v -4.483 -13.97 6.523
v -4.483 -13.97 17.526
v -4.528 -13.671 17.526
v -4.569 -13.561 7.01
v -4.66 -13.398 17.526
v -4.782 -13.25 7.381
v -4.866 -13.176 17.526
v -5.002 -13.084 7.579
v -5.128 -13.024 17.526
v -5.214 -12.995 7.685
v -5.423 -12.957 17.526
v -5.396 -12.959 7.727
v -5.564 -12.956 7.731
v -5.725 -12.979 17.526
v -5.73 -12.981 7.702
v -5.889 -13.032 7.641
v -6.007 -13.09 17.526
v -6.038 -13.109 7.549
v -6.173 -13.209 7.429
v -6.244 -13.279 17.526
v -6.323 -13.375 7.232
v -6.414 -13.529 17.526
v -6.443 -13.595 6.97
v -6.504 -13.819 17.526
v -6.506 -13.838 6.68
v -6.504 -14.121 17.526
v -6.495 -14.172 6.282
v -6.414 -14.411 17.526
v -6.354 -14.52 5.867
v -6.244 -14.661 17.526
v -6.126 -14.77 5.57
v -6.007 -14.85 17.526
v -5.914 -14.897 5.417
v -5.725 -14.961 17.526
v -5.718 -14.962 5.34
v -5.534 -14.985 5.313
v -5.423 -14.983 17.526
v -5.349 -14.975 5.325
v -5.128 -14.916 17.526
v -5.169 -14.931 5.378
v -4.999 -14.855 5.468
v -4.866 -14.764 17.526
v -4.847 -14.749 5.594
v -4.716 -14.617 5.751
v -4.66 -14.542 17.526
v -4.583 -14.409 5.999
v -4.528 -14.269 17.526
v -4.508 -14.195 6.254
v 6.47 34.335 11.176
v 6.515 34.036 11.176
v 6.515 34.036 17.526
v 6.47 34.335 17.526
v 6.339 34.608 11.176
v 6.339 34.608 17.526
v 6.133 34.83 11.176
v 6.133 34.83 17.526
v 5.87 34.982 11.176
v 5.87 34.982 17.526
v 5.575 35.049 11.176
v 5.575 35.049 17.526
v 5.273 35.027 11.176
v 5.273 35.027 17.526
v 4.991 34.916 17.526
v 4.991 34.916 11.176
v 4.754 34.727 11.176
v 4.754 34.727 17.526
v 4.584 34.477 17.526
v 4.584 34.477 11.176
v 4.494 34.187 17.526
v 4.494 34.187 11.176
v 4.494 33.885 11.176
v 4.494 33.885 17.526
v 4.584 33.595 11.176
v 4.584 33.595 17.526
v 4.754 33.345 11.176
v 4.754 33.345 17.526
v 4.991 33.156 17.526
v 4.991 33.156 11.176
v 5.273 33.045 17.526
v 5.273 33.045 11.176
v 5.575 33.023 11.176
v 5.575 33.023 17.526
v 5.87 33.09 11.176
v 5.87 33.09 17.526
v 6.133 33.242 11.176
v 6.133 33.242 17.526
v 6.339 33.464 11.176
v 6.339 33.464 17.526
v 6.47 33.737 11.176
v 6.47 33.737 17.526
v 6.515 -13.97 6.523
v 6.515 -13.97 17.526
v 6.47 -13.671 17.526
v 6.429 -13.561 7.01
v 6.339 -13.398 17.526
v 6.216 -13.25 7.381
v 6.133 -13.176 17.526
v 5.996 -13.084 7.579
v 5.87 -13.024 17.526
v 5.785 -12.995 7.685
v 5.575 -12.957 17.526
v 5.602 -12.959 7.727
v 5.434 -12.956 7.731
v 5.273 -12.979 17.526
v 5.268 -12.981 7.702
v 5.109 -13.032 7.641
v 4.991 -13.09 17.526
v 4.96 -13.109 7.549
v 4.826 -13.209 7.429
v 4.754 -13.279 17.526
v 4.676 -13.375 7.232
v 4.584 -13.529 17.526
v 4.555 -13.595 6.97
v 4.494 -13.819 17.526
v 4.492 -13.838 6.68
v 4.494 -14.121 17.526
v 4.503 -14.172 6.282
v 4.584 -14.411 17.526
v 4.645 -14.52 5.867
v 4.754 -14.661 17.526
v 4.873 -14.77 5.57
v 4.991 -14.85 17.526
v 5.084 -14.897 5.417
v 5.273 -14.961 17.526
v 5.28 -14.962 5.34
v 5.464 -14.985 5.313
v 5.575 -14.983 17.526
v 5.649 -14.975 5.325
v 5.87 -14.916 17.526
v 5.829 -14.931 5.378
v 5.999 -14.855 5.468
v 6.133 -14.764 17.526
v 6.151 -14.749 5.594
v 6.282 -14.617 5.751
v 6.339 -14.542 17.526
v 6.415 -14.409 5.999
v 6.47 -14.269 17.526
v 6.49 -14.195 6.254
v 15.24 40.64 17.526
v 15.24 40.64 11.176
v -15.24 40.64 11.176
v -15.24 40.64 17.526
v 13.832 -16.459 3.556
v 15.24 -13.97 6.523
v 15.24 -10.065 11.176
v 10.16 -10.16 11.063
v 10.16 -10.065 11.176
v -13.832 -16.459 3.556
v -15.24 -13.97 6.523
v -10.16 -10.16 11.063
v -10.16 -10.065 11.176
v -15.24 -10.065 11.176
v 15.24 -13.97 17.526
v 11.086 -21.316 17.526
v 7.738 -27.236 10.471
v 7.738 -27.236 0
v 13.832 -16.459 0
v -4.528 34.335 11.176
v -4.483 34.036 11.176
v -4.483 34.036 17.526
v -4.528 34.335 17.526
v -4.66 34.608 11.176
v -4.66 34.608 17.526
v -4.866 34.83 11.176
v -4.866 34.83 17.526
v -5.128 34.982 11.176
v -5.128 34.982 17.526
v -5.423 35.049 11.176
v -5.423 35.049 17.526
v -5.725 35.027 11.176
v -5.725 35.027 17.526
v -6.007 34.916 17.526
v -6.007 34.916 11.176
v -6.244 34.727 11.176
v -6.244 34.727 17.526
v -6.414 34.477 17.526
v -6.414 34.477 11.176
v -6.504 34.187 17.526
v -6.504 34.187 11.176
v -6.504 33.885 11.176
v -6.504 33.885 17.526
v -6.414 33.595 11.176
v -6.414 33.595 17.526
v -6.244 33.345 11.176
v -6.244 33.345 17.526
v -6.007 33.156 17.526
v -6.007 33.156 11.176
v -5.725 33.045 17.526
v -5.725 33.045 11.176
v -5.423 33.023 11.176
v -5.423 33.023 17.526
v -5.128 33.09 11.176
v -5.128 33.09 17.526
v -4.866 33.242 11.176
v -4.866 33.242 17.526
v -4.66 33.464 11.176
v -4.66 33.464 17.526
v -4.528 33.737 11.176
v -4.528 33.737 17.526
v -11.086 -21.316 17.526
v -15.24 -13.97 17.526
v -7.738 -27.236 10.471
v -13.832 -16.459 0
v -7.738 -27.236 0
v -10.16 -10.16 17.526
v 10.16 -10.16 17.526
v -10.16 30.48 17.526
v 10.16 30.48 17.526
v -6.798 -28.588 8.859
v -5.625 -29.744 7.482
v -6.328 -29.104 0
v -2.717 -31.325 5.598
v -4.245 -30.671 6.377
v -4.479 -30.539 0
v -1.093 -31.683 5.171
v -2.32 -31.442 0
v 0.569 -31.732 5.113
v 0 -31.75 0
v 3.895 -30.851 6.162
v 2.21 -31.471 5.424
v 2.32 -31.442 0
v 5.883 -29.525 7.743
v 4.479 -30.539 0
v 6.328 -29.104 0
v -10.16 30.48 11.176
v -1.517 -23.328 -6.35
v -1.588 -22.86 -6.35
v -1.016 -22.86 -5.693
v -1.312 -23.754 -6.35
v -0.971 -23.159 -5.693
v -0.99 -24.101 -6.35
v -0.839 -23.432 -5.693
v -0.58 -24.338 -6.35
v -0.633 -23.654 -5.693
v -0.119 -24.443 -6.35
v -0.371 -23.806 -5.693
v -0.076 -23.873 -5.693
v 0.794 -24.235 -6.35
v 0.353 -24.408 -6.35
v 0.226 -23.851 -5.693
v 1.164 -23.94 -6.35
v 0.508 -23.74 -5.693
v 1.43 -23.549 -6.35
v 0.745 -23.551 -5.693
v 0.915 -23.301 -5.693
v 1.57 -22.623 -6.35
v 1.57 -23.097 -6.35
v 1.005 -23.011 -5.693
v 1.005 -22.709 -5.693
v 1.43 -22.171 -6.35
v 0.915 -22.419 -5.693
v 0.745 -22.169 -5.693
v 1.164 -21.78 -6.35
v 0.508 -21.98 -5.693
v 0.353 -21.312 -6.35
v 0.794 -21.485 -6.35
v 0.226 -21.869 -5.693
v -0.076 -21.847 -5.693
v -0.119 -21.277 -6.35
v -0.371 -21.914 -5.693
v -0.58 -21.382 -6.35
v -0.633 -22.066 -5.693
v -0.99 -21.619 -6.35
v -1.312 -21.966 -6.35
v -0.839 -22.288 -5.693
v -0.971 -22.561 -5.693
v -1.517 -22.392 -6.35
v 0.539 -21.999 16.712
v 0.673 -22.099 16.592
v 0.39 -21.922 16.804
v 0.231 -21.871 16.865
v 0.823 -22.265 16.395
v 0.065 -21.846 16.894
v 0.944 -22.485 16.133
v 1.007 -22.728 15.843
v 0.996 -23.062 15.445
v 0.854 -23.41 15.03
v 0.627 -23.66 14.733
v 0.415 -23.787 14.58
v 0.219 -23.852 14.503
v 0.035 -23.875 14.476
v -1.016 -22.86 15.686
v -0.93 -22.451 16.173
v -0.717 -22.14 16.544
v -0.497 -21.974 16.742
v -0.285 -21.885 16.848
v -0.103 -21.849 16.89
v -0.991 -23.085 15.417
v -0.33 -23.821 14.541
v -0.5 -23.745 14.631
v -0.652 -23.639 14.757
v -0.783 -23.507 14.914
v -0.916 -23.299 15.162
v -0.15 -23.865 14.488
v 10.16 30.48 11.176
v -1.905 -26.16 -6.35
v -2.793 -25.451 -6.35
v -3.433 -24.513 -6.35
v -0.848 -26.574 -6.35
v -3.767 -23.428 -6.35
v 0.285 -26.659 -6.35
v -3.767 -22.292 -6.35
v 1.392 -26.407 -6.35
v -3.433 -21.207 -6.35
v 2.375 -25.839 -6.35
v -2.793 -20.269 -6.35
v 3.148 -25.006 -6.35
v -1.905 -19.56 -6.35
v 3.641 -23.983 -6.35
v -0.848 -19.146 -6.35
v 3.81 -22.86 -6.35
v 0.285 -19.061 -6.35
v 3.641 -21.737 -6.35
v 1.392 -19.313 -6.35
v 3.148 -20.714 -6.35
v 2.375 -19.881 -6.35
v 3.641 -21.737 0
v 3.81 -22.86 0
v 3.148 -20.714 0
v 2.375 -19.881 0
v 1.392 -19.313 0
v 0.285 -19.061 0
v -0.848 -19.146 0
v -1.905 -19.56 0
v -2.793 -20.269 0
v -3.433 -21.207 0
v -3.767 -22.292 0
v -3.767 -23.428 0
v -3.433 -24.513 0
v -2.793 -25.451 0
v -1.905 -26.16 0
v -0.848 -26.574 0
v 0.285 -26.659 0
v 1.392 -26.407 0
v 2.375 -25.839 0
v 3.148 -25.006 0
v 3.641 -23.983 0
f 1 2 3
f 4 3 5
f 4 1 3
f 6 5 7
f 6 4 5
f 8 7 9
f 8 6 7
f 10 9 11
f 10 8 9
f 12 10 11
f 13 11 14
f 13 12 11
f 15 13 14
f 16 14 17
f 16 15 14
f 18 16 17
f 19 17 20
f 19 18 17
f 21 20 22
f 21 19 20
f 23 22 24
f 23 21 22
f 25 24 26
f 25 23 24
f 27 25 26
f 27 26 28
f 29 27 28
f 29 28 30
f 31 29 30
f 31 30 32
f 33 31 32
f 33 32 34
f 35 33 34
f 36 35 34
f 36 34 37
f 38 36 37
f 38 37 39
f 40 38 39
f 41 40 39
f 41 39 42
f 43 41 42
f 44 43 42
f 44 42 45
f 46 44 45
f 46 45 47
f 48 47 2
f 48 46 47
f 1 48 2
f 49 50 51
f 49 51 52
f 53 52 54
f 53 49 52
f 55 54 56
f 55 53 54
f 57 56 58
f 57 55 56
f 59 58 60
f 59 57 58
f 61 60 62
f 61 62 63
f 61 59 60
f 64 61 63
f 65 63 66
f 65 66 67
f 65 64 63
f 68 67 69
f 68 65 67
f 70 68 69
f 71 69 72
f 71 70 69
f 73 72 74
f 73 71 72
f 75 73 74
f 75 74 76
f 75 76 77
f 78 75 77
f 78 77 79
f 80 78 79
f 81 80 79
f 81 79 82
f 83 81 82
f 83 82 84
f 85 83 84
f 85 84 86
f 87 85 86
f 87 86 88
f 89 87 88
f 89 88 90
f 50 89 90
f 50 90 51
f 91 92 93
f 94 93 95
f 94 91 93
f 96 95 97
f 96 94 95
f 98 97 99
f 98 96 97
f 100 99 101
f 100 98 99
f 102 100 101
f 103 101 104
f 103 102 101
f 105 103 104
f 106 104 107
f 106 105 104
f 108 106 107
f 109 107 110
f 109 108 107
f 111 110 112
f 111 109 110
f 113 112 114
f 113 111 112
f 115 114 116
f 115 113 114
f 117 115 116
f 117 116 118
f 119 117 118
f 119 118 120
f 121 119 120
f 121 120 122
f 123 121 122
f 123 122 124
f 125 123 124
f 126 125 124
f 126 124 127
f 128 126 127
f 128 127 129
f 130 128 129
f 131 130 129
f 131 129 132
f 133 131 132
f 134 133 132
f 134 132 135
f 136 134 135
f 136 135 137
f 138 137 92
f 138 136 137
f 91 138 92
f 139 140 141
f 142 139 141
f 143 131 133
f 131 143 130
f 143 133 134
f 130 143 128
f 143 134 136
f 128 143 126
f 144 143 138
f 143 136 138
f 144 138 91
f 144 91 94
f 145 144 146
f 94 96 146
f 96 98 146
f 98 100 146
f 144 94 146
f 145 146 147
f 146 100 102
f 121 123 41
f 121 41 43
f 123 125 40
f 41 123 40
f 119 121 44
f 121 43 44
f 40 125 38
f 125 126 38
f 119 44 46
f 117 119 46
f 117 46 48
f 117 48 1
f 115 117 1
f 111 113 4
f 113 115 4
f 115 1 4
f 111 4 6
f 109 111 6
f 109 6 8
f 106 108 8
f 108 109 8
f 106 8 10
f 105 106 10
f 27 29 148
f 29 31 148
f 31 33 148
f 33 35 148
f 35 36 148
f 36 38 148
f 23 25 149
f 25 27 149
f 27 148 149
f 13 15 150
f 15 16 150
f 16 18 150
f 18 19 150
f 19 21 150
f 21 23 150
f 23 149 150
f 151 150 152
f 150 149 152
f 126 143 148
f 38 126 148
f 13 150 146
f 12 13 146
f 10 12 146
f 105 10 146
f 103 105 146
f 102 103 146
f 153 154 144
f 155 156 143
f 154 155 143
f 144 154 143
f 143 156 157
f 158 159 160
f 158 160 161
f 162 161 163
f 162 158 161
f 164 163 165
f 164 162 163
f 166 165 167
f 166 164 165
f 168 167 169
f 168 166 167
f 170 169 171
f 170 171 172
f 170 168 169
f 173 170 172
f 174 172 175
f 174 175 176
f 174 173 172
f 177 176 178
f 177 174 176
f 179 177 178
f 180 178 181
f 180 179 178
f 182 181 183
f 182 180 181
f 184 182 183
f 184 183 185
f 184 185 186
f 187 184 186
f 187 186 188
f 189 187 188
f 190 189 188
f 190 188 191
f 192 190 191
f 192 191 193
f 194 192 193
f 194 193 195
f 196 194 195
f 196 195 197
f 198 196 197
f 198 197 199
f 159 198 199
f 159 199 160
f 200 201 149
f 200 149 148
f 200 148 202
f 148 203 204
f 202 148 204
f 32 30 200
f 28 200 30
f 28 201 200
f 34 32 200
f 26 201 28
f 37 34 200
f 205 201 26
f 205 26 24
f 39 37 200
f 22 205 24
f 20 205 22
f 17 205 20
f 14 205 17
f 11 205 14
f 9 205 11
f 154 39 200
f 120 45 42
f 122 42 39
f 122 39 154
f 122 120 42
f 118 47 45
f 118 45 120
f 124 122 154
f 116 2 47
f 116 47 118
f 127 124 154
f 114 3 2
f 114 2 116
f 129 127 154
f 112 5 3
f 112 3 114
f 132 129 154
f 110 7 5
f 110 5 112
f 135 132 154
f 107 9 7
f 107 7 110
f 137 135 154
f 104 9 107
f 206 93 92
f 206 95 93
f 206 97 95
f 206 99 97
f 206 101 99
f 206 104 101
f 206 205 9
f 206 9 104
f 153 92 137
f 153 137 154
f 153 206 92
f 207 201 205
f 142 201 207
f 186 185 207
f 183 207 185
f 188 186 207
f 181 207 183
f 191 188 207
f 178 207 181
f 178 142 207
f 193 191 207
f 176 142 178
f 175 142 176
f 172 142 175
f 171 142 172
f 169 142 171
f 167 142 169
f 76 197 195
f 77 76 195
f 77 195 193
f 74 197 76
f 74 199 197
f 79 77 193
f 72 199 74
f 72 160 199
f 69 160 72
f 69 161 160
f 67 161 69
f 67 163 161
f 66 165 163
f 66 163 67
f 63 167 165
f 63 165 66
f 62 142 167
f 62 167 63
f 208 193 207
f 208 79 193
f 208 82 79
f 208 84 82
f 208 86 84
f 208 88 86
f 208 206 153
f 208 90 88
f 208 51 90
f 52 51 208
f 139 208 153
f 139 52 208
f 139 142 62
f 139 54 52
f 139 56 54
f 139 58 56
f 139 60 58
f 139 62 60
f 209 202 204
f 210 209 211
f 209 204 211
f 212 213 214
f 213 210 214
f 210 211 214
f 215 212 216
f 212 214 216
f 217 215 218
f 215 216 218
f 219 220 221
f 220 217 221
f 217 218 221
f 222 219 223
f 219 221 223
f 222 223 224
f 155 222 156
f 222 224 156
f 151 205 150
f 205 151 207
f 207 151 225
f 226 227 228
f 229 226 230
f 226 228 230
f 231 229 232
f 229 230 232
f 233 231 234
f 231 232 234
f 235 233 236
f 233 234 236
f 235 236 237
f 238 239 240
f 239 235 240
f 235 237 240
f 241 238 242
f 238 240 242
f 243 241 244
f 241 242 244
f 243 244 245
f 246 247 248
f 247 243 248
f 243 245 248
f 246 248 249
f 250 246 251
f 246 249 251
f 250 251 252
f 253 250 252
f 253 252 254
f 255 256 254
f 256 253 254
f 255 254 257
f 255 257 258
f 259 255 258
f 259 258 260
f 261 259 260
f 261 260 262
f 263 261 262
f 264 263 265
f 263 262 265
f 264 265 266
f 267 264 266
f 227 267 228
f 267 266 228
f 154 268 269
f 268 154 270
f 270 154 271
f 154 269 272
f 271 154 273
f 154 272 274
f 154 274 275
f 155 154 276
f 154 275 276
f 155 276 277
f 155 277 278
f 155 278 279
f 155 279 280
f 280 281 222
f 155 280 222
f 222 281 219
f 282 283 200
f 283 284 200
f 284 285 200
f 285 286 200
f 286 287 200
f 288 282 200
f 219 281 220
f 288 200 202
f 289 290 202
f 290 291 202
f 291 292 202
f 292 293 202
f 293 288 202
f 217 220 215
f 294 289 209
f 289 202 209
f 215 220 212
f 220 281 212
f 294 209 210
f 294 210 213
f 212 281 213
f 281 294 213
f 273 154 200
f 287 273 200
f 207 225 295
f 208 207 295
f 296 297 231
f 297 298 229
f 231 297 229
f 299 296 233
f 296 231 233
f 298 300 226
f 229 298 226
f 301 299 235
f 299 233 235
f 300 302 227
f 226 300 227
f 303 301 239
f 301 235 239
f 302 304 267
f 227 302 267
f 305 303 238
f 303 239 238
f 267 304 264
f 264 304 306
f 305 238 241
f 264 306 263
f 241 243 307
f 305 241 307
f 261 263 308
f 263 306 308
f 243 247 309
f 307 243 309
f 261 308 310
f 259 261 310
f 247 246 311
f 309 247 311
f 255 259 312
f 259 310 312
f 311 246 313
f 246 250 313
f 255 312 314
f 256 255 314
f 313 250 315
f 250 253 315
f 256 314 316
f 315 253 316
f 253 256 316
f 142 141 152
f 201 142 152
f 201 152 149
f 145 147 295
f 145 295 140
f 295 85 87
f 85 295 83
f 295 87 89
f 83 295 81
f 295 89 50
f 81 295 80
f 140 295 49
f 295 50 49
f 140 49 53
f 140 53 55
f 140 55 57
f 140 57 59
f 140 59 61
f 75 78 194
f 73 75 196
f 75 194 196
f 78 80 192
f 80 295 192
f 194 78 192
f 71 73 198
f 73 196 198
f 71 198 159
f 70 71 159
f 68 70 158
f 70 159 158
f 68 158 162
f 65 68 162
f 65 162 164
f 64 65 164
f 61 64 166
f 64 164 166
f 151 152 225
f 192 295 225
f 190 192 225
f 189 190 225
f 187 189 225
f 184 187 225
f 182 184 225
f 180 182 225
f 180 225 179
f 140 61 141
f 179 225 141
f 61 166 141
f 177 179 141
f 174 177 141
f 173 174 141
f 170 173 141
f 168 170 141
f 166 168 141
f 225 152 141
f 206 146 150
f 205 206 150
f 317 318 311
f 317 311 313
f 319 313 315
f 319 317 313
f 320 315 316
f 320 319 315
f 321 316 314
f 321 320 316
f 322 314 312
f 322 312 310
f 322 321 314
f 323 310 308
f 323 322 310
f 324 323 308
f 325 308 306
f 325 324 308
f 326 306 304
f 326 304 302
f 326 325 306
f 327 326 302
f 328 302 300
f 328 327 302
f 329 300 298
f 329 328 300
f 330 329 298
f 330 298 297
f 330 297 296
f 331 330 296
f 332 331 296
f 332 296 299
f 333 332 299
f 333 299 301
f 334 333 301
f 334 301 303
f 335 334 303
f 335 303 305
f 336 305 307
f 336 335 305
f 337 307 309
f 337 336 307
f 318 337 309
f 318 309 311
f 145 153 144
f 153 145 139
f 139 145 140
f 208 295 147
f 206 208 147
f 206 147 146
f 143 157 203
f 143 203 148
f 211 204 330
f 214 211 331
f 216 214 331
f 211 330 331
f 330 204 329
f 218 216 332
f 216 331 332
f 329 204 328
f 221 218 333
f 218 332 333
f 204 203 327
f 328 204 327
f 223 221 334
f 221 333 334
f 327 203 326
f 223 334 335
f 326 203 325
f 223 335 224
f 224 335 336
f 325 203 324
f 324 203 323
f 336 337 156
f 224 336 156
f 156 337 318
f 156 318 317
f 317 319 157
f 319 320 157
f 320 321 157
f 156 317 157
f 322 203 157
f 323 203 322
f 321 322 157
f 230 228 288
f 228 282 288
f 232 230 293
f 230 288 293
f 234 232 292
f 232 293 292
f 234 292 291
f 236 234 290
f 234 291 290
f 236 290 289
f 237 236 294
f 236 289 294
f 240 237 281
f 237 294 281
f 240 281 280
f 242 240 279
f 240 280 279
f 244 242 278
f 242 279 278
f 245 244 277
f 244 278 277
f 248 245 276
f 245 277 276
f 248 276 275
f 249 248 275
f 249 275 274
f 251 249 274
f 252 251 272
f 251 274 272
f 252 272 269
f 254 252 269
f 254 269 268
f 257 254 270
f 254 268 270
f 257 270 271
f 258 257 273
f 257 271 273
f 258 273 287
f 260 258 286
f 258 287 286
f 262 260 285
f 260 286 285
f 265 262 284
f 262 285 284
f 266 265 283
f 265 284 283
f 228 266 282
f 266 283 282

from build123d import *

# Parameters (mm, degrees)
F0_R           = 1.016
F1_DEPTH       = 17.526
F3_START       = -25.4
F3_DEPTH       = 40.641
F4_R           = 3.81
F5_DEPTH       = 6.35
F7_D           = 2.032
F7_CSINK_D     = 3.175
F7_CSINK_ANGLE = 82


with BuildPart() as f1:
    # F0 (on Top) → F1 (new body)
    with BuildSketch(Plane.XY):
        with BuildLine():
            Line((15.24, 40.64), (0, 40.64))
            Line((0, 40.64), (-15.24, 40.64))
            Line((-15.24, 40.64), (-15.24, -13.97))
            Line((-15.24, -13.97), (-7.7384455959, -27.2359067358))
            ThreePointArc((-7.7384455959, -27.2359067358), (-2.2624454306, -14.2627073637), (8.89, -22.86))
            ThreePointArc((8.89, -22.86), (8.5972926363, -25.1224454306), (7.7384455959, -27.2359067358))
            Line((7.7384455959, -27.2359067358), (15.24, -13.97))
            Line((15.24, -13.97), (15.24, 40.64))
        make_face()
        with Locations((-5.4991, -13.97)):
            Circle(F0_R, mode=Mode.SUBTRACT)
        with Locations((5.4991, -13.97)):
            Circle(F0_R, mode=Mode.SUBTRACT)
        with Locations((-5.4991, 34.036)):
            Circle(F0_R, mode=Mode.SUBTRACT)
        Polygon((10.16, -10.16), (0, -10.16), (-10.16, -10.16), (-10.16, 30.48), (0, 30.48), (10.16, 30.48), align=None, mode=Mode.SUBTRACT)
        with Locations((5.4991, 34.036)):
            Circle(F0_R, mode=Mode.SUBTRACT)
        with BuildLine():
            ThreePointArc((8.89, -22.86), (-2.2624454306, -14.2627073637), (-7.7384455959, -27.2359067358))
            ThreePointArc((-7.7384455959, -27.2359067358), (0, -31.75), (7.7384455959, -27.2359067358))
            ThreePointArc((7.7384455959, -27.2359067358), (8.5972926363, -25.1224454306), (8.89, -22.86))
        make_face()
    extrude(amount=F1_DEPTH)

    # F2 (on Right) → F3 (intersect)
    with BuildSketch(Plane.YZ.offset(F3_START)):
        Polygon((-31.7592067564, 5.08), (-31.7592067564, 0), (-16.4593220198, 0), (-16.4593220198, 3.556), (-10.0653828302, 11.176), (41.7786614893, 11.176), (41.7786614893, 17.526), (-21.3157727468, 17.526), align=None)
    extrude(amount=F3_DEPTH, mode=Mode.INTERSECT)

    # F4 (on Top) → F5 (join)
    with BuildSketch(Plane.XY):
        with Locations((0, -22.86)):
            Circle(F4_R)
    extrude(amount=-F5_DEPTH)

    # F7 (through all)
    with Locations(Plane(origin=(0, 0, -6.35), x_dir=(1, 0, 0), z_dir=(0, 0, -1))):
        with Locations((0, 22.86)):
            CounterSinkHole(F7_D / 2, F7_CSINK_D / 2, counter_sink_angle=F7_CSINK_ANGLE)


solid = f1.part
